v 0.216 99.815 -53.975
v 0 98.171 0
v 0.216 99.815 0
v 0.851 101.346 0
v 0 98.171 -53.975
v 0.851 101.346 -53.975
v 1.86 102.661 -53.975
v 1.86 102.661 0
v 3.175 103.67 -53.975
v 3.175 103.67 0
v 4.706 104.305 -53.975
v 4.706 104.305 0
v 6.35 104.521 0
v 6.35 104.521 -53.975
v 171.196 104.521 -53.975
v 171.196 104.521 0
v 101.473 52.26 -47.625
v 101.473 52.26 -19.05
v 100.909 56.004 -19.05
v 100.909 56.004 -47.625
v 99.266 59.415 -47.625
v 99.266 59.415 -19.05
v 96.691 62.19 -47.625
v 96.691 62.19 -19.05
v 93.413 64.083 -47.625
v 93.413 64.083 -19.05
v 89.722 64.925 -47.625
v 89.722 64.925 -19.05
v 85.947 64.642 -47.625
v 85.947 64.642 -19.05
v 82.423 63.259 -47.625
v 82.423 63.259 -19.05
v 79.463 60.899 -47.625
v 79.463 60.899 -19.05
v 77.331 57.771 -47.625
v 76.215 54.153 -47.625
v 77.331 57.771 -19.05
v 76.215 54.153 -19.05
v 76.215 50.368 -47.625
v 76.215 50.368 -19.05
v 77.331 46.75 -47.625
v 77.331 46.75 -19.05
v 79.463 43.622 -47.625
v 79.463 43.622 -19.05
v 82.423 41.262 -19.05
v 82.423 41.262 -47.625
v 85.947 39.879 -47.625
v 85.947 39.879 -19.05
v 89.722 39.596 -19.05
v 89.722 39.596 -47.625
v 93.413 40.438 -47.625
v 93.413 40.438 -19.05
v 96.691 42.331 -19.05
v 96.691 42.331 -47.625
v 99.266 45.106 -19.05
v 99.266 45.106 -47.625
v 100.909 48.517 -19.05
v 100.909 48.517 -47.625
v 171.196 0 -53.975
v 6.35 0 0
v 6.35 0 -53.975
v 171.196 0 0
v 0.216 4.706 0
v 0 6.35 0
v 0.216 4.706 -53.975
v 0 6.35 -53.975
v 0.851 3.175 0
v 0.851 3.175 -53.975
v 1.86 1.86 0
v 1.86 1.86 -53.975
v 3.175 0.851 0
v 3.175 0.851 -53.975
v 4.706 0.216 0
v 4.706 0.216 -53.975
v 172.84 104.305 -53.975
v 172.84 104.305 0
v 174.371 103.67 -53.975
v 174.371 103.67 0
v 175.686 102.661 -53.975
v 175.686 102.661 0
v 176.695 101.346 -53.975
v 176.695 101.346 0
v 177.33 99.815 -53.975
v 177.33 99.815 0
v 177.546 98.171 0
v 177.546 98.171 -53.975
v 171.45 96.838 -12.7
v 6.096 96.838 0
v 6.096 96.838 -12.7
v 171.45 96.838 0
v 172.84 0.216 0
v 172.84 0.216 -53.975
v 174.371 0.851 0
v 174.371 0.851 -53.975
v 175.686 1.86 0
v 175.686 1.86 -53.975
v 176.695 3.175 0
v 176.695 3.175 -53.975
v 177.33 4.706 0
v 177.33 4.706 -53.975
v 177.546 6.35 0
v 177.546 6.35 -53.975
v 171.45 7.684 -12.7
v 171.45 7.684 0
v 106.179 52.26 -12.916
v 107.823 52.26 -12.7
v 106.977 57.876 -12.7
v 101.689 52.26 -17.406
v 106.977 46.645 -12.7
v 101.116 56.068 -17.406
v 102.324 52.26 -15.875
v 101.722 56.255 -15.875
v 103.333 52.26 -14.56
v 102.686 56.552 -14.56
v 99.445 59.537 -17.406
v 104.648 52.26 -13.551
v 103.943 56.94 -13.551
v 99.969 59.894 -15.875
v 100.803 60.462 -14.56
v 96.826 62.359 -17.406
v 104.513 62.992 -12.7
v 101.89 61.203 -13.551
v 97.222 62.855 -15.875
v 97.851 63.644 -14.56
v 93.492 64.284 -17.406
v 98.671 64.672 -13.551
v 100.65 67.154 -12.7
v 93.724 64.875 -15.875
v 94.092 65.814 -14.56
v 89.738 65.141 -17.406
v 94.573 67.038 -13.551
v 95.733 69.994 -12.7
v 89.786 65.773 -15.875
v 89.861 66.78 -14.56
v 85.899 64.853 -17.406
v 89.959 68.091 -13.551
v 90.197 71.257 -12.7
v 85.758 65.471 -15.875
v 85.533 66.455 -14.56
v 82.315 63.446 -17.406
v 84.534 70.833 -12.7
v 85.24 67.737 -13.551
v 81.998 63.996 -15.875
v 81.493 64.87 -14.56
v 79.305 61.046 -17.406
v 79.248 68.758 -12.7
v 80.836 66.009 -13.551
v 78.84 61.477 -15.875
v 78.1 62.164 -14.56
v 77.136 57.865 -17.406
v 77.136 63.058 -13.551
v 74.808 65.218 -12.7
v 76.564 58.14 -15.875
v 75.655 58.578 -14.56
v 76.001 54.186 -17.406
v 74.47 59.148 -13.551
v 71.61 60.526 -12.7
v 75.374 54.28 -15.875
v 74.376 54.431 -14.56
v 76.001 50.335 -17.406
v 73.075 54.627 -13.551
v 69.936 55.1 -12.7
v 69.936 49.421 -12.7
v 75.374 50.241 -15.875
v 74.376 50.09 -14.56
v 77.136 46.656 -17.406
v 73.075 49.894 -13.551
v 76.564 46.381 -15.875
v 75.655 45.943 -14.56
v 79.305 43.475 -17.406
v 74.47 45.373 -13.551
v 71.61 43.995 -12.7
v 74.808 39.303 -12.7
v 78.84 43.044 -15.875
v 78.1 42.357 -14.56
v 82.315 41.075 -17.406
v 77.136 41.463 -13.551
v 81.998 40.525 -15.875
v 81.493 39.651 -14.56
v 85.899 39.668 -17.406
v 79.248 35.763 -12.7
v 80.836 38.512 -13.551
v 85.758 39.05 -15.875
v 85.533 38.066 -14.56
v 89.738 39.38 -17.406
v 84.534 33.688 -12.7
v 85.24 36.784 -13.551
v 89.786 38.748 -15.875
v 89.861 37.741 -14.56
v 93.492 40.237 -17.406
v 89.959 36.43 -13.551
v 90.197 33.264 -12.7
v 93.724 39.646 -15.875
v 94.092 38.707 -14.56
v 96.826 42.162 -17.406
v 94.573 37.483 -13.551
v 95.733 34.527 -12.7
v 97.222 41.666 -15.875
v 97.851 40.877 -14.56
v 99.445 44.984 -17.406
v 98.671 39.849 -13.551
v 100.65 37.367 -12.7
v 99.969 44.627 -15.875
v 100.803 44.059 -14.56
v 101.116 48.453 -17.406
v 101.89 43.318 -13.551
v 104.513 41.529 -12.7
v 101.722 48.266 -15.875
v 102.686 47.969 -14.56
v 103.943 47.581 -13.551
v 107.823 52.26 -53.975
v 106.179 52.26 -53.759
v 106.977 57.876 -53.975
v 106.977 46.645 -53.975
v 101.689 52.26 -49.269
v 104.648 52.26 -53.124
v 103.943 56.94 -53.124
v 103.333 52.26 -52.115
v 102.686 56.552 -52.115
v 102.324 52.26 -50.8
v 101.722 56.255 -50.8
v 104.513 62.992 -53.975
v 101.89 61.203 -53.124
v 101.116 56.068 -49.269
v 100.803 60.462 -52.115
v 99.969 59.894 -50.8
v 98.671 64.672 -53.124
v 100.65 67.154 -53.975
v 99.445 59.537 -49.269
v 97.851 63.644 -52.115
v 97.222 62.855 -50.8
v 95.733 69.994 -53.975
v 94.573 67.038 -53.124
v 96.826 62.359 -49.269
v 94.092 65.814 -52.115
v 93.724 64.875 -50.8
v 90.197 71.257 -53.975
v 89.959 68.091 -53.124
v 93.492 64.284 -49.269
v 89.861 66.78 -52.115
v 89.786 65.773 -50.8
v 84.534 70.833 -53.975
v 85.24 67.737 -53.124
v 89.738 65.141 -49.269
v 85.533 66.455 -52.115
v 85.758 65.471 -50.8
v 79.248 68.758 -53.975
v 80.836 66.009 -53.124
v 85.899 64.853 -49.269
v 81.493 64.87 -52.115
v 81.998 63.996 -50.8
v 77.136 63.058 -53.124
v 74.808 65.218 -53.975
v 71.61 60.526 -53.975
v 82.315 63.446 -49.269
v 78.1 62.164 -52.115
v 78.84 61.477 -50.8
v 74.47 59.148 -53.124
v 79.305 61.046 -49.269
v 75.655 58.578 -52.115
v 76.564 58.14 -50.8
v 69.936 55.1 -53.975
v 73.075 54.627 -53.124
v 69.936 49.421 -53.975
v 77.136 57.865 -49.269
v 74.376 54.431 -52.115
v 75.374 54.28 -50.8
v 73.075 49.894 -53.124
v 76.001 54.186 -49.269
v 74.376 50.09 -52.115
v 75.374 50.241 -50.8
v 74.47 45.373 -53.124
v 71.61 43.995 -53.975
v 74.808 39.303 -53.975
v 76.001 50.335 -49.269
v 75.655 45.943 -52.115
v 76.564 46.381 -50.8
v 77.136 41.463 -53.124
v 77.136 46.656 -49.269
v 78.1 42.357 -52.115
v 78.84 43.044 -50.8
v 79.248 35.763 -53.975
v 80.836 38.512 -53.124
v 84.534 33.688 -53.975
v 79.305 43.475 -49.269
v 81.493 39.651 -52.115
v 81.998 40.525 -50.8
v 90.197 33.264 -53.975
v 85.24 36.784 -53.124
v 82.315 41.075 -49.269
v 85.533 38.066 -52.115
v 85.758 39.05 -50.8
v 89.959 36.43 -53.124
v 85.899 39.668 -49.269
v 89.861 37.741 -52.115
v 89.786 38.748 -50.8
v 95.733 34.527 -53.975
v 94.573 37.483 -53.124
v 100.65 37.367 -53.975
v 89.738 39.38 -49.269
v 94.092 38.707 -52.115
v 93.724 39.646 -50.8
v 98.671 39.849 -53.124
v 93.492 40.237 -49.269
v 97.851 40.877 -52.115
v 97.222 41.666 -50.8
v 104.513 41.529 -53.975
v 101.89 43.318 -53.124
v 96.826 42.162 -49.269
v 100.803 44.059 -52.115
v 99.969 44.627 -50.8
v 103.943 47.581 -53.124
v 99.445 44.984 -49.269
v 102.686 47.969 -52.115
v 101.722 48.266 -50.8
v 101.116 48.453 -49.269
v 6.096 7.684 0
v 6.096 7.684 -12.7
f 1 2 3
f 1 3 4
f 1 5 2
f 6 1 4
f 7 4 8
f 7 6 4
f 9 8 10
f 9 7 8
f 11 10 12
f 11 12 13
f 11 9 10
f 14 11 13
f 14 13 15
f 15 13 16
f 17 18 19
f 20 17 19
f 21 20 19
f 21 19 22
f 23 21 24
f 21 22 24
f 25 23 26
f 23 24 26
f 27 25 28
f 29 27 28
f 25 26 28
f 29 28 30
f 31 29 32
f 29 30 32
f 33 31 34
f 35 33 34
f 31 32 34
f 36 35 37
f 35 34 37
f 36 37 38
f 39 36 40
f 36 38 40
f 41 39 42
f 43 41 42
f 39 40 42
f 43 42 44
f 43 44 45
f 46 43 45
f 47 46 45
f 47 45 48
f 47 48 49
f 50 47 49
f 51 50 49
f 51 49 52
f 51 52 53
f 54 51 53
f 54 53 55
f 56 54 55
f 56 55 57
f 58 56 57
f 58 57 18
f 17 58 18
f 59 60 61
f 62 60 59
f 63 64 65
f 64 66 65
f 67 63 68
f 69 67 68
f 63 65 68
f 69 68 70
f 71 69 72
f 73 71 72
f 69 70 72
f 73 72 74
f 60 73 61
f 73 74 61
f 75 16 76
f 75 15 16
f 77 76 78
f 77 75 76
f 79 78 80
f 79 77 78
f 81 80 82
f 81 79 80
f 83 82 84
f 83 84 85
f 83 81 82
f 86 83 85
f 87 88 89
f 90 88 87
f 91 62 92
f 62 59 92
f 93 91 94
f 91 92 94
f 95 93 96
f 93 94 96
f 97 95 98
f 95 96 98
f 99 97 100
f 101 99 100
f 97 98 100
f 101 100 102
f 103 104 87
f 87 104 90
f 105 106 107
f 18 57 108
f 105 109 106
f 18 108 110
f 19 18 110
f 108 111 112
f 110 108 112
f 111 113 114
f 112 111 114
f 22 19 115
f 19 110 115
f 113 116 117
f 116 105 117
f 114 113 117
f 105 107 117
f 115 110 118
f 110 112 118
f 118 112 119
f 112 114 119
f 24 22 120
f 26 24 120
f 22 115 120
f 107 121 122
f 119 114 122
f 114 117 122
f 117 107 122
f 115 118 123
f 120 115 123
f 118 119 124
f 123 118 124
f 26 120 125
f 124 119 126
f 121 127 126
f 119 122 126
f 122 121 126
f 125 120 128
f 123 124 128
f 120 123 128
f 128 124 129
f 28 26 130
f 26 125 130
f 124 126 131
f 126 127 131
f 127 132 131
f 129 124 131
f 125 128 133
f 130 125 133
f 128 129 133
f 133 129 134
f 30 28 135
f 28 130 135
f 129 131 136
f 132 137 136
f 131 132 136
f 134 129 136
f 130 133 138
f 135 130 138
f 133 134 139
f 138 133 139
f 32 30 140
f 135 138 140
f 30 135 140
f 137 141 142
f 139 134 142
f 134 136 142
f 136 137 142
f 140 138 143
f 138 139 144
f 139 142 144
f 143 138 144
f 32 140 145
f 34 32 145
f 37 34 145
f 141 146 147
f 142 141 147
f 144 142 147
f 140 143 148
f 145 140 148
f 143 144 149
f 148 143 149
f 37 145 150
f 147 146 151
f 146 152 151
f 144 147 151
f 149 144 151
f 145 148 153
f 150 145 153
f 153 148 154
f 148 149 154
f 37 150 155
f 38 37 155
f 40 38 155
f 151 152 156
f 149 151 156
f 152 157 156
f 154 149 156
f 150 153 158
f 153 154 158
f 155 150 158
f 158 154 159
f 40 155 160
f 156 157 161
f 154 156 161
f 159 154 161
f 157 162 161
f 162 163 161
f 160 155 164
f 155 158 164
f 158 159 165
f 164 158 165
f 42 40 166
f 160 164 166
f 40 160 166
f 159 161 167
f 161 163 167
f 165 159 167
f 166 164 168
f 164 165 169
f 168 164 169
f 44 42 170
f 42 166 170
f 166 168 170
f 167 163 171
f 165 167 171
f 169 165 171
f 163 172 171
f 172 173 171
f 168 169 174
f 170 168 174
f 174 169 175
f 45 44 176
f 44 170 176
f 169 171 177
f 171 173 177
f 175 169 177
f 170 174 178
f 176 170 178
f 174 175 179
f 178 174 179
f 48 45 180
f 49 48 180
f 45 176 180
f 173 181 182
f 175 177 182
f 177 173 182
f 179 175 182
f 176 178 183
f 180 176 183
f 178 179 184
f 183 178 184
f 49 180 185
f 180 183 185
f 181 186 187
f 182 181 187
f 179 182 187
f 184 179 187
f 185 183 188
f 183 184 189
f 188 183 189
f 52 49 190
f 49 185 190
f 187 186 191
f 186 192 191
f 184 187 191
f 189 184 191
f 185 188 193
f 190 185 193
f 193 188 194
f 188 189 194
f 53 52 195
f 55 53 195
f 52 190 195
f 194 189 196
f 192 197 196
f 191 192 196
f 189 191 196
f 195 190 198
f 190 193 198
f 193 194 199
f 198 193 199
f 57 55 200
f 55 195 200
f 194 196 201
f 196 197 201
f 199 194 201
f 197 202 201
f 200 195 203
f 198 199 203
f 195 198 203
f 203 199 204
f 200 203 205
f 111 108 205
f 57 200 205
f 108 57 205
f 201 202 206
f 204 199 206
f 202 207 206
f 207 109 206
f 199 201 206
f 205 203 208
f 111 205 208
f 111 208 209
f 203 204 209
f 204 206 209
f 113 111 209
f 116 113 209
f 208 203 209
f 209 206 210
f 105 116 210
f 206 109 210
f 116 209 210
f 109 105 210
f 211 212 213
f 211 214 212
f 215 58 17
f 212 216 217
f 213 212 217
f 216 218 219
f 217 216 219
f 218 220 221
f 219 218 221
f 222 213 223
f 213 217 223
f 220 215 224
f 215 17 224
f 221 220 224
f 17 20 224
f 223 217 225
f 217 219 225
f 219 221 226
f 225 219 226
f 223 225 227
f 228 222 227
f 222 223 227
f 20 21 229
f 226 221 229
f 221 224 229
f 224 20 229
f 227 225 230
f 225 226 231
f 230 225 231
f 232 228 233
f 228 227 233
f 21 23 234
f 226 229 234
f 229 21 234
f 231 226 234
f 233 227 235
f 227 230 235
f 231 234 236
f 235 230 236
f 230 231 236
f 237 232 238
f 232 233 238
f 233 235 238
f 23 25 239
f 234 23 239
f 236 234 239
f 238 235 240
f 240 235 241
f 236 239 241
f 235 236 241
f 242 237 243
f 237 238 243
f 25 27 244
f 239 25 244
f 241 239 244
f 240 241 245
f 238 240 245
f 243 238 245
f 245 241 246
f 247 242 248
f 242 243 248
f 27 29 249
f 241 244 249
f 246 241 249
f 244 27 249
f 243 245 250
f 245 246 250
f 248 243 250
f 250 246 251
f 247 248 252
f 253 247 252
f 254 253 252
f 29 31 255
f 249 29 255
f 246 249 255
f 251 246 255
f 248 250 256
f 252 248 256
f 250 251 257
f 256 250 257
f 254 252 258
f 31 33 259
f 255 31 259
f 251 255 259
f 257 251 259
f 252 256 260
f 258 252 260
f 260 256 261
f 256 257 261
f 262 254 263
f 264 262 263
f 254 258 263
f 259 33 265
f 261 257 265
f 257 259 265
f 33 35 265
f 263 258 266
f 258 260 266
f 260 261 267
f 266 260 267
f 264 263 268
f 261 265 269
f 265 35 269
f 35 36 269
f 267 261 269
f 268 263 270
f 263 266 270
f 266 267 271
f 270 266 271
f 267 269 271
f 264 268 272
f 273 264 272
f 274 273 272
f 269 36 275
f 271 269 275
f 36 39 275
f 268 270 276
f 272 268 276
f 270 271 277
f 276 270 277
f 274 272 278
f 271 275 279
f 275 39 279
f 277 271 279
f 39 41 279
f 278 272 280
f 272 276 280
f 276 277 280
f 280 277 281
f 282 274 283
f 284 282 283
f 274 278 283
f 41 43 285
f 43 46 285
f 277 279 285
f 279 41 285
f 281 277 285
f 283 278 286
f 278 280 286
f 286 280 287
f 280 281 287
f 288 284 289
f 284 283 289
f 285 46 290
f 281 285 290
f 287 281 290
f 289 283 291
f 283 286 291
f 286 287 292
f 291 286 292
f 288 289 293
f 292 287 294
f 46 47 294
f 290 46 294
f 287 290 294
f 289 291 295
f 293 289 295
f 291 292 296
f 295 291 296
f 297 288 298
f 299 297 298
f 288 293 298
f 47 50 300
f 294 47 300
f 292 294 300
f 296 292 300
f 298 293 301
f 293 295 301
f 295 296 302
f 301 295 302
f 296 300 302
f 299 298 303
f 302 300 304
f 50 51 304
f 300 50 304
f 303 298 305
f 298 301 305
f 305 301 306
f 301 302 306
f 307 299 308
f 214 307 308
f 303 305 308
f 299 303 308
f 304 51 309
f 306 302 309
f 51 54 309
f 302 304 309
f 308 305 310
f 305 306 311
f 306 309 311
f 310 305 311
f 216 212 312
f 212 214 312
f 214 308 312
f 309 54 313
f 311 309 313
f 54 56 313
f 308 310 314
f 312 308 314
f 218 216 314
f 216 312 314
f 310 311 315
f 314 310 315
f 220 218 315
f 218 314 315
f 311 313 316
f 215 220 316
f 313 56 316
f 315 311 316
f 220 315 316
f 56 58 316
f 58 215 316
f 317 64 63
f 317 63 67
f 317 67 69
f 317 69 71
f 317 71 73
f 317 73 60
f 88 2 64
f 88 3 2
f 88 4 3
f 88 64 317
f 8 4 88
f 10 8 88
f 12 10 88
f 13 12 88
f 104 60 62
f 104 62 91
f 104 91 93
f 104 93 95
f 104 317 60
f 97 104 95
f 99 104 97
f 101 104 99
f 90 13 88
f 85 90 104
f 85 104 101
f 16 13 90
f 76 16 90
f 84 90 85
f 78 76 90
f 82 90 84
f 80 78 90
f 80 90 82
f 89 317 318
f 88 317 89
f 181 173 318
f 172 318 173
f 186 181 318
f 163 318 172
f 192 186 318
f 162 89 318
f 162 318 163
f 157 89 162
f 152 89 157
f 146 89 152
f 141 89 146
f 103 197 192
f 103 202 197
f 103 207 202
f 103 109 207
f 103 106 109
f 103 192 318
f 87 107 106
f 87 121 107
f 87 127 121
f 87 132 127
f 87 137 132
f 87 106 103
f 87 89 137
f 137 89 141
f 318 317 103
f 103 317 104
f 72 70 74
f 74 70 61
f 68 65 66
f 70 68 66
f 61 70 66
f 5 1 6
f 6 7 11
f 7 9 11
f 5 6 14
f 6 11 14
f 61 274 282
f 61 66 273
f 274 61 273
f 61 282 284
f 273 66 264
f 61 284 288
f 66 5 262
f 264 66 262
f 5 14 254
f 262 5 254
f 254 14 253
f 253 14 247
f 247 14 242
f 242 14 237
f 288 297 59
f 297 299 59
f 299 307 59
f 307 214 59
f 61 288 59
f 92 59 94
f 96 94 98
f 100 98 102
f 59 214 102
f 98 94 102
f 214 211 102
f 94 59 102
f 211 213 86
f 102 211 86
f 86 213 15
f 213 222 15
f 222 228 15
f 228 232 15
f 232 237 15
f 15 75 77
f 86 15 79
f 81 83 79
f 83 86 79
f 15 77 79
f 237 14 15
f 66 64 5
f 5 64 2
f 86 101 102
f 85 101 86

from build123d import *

# Parameters (mm, degrees)
F0_W     = 177.546
F0_H     = 104.521
F0_W_2   = 165.354
F0_H_2   = 89.154
F0_R     = 12.7
F1_DEPTH = 53.975
F2_DEPTH = 12.7
F3_R     = 6.35


with BuildPart() as f1:
    # F0 (on Top) → F1 (new body)
    with BuildSketch(Plane.XY):
        with Locations((88.773, 52.2605)):
            Rectangle(F0_W, F0_H)
        with Locations((88.773, 52.2605)):
            Rectangle(F0_W_2, F0_H_2, mode=Mode.SUBTRACT)
        with Locations((88.773, 52.2605)):
            Rectangle(F0_W_2, F0_H_2)
        with Locations((88.773, 52.2605)):
            Circle(F0_R, mode=Mode.SUBTRACT)
    extrude(amount=-F1_DEPTH)

    # F0 (on Top) → F2 (cut)
    with BuildSketch(Plane.XY):
        with Locations((88.773, 52.2605)):
            Rectangle(F0_W_2, F0_H_2)
        with Locations((88.773, 52.2605)):
            Circle(F0_R, mode=Mode.SUBTRACT)
    extrude(amount=-F2_DEPTH, mode=Mode.SUBTRACT)

    # F3
    f3_edges = [f1.edges().sort_by_distance(p)[0] for p in [
        (0, 0, -26.9875),
        (177.546, 104.521, -26.9875),
        (177.546, 0, -26.9875),
        (0, 104.521, -26.9875),
        (76.073, 52.2605, -12.7),
        (76.073, 52.2605, -53.975),
    ]]
    fillet(f3_edges, radius=F3_R)


solid = f1.part
